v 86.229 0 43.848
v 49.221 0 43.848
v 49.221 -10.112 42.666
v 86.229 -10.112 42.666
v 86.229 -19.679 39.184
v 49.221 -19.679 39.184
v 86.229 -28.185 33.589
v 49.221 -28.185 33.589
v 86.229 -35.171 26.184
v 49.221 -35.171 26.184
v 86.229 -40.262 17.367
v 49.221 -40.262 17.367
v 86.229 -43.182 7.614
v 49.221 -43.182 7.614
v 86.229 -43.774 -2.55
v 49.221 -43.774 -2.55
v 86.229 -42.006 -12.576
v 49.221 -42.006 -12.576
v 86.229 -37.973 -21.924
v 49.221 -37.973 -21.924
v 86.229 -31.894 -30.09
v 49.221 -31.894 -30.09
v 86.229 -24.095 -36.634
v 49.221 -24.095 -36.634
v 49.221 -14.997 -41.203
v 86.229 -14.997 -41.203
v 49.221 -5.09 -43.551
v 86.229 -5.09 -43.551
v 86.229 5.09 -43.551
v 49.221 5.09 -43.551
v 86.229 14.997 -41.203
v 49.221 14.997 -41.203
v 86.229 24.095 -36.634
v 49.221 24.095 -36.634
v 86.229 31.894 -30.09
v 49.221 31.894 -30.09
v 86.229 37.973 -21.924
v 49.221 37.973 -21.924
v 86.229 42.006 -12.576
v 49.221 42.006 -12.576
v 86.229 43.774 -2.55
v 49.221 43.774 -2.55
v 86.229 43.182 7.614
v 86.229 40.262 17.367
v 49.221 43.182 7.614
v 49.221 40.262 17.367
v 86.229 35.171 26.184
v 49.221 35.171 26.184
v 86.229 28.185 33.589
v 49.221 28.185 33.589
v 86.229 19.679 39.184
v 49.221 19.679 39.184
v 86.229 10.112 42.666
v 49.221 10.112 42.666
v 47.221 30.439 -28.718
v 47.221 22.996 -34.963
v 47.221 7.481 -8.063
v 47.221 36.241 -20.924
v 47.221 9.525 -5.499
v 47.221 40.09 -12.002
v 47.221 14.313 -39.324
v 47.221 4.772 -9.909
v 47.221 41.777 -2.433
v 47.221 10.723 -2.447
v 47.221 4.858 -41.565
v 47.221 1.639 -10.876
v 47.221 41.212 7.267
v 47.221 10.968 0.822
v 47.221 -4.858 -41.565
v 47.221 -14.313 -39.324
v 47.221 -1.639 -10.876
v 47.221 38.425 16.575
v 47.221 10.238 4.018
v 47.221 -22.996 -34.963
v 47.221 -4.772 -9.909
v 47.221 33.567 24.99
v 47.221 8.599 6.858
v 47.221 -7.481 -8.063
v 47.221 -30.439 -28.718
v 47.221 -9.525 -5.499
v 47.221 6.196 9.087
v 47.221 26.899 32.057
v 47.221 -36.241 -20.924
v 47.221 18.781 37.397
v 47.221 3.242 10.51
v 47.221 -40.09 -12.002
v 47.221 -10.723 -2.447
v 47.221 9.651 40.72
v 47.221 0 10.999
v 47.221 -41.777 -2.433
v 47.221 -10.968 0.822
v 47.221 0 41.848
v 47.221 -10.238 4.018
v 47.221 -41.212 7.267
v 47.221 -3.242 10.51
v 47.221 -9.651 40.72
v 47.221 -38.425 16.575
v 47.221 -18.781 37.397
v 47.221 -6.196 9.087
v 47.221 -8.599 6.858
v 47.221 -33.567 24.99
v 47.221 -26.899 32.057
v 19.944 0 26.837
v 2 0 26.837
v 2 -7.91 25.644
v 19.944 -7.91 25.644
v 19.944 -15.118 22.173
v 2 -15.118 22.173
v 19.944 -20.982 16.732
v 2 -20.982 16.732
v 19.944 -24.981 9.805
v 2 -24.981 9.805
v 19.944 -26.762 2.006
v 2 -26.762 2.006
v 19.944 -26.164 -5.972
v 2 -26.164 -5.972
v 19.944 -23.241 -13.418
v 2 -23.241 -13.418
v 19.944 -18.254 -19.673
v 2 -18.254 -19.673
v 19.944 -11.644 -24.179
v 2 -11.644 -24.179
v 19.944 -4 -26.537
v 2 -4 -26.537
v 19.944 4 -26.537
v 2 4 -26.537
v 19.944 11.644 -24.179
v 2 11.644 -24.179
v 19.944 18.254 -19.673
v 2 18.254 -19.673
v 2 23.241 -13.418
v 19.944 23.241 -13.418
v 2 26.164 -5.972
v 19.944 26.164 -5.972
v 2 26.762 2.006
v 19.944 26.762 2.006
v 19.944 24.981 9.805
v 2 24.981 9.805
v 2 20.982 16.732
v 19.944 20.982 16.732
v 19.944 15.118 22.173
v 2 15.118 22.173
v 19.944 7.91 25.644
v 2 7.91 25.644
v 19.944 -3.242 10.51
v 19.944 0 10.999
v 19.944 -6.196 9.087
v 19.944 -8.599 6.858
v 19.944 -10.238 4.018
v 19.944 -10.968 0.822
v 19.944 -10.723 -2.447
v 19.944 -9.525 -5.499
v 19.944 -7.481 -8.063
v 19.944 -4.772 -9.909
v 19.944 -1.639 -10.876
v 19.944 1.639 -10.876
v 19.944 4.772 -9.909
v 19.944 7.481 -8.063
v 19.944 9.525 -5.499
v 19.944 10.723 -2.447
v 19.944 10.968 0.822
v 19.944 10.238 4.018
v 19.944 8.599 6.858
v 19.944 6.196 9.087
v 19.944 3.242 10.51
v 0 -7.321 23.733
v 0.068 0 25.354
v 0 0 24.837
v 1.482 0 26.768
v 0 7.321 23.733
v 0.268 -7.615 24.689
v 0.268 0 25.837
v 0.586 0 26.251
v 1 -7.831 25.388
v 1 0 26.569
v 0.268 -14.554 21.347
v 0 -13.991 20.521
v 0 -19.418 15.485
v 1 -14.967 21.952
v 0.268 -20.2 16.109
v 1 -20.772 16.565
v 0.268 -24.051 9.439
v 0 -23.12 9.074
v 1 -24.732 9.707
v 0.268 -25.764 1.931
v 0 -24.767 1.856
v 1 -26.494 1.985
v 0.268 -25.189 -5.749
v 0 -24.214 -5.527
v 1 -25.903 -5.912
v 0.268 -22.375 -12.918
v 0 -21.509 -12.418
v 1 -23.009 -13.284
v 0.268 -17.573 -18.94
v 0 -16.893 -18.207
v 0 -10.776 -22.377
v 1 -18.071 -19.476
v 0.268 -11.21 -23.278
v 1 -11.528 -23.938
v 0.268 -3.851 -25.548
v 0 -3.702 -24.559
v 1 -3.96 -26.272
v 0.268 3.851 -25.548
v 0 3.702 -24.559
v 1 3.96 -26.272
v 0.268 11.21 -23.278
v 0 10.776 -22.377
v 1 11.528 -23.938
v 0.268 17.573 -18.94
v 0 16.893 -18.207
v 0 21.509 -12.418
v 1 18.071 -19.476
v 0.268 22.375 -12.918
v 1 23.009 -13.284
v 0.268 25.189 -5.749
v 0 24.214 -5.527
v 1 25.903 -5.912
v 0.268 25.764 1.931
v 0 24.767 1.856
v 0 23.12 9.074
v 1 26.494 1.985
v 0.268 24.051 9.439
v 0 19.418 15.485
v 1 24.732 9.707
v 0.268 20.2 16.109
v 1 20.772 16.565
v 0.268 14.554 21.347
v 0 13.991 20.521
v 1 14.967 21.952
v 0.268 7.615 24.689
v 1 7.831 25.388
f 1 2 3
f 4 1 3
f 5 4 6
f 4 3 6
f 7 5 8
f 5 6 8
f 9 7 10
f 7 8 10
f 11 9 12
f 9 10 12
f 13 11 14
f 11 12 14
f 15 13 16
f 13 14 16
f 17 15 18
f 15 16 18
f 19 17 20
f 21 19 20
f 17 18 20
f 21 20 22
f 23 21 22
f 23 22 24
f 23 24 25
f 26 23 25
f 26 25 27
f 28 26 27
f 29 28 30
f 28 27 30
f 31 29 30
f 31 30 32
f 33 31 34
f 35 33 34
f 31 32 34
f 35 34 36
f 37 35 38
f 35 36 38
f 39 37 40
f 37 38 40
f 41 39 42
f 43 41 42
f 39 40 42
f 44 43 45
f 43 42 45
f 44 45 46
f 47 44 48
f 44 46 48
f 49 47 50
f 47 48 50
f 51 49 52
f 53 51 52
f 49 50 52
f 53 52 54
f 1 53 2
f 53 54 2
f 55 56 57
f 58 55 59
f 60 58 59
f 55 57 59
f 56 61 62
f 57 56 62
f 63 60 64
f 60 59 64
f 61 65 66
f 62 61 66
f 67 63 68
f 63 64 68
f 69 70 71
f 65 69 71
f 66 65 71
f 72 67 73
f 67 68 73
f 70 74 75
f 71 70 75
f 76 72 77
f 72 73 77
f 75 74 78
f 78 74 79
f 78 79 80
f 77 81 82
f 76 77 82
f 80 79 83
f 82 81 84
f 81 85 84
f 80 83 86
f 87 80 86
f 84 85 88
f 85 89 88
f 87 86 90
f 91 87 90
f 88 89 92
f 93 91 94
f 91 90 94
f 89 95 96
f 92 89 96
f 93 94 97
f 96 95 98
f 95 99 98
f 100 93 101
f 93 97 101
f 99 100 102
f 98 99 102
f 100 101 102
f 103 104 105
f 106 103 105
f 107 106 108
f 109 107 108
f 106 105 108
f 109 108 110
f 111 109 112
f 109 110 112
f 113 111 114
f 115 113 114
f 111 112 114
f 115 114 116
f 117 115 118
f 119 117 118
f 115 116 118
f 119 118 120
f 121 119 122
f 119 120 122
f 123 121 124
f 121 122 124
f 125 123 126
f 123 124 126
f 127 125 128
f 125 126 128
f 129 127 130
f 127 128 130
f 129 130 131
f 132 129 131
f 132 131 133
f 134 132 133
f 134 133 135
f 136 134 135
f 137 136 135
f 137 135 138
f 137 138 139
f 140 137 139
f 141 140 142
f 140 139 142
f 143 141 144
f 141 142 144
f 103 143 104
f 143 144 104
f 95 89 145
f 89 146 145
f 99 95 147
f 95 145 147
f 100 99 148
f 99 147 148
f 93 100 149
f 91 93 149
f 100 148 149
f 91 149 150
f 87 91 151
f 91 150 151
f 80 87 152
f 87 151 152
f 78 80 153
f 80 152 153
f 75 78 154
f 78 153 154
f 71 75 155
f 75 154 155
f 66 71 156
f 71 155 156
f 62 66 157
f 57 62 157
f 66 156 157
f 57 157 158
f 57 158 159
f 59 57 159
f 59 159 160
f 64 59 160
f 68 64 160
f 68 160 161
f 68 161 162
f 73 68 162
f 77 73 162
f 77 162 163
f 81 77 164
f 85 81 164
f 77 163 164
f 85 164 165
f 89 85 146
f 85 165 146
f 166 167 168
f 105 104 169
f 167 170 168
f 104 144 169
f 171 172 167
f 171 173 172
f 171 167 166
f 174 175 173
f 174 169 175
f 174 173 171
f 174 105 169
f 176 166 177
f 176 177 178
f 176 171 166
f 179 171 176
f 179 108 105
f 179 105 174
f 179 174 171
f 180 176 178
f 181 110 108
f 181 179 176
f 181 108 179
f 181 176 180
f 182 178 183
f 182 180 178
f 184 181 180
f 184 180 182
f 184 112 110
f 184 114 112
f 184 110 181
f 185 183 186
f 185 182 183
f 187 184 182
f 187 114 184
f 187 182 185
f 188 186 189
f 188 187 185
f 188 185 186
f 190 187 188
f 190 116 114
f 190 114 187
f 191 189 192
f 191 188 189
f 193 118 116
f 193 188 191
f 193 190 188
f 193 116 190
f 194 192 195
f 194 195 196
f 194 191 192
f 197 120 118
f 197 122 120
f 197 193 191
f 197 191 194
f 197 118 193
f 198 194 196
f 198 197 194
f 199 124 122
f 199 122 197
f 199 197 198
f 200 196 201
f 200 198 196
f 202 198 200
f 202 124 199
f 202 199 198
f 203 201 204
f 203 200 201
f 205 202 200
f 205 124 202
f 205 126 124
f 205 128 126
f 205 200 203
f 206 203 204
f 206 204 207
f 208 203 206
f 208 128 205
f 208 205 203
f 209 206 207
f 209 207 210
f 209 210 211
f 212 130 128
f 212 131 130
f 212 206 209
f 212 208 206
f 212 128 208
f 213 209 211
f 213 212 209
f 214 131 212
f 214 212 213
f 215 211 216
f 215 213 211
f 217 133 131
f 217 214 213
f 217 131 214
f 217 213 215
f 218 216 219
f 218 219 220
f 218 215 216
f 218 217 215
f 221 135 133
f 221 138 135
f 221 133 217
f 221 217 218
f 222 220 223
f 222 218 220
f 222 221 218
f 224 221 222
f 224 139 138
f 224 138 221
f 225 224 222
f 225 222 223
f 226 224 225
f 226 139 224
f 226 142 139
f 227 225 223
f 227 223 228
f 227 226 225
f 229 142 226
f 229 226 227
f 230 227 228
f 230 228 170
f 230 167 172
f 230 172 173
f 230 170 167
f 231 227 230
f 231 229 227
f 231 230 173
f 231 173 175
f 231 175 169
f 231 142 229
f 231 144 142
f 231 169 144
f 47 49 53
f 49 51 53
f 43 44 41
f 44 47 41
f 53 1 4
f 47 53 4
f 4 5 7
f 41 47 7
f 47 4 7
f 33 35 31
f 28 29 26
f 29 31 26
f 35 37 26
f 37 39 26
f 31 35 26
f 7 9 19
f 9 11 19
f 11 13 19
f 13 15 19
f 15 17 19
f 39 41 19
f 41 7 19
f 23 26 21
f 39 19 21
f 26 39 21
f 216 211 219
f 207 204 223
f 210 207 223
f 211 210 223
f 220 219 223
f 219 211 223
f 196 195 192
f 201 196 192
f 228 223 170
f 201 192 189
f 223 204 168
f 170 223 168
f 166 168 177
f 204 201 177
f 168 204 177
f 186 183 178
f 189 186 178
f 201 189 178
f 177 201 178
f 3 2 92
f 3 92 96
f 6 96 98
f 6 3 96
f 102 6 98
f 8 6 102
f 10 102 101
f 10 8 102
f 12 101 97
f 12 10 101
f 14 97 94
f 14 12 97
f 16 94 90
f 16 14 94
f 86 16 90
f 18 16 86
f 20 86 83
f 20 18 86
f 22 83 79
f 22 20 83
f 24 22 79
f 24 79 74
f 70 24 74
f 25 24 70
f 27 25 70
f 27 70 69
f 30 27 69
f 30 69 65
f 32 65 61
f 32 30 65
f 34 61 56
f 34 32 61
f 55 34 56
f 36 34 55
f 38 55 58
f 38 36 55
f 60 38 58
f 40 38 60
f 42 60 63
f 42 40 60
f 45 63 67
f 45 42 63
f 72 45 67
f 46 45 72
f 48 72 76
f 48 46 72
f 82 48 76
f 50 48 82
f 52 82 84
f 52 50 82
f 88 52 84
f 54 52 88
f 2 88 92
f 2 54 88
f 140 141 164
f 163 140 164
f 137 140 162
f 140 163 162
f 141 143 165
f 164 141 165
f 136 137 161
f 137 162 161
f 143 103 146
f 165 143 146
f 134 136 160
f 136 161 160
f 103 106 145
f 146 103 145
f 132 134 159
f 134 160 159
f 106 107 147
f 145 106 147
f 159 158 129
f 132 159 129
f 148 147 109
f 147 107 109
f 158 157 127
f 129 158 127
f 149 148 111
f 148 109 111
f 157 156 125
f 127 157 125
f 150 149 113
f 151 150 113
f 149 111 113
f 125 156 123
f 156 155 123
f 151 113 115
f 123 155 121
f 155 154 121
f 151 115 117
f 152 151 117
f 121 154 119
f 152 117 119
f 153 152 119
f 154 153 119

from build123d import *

# Parameters (mm, degrees)
F2_R    = 2
F3_SIZE = 2


with BuildPart() as f1:
    # F0 (on Front) → F1 (revolve)
    with BuildSketch(Plane.XZ):
        Polygon((0, 26.836595), (0, 0), (86.229056, 0), (86.229056, 43.847769), (47.220673, 43.847769), (47.220673, 10.998603), (19.944135, 10.998603), (19.944135, 26.836595), align=None)
    revolve(axis=Axis((43.114528, 0, 0), (1, 0, 0)))

    # F2
    f2_edges = [f1.edges().sort_by_distance(p)[0] for p in [
        (0, 0, -26.836595),
    ]]
    fillet(f2_edges, radius=F2_R)

    # F3
    f3_edges = [f1.edges().sort_by_distance(p)[0] for p in [
        (47.220673, 0, -43.847769),
    ]]
    chamfer(f3_edges, length=F3_SIZE)


solid = f1.part
